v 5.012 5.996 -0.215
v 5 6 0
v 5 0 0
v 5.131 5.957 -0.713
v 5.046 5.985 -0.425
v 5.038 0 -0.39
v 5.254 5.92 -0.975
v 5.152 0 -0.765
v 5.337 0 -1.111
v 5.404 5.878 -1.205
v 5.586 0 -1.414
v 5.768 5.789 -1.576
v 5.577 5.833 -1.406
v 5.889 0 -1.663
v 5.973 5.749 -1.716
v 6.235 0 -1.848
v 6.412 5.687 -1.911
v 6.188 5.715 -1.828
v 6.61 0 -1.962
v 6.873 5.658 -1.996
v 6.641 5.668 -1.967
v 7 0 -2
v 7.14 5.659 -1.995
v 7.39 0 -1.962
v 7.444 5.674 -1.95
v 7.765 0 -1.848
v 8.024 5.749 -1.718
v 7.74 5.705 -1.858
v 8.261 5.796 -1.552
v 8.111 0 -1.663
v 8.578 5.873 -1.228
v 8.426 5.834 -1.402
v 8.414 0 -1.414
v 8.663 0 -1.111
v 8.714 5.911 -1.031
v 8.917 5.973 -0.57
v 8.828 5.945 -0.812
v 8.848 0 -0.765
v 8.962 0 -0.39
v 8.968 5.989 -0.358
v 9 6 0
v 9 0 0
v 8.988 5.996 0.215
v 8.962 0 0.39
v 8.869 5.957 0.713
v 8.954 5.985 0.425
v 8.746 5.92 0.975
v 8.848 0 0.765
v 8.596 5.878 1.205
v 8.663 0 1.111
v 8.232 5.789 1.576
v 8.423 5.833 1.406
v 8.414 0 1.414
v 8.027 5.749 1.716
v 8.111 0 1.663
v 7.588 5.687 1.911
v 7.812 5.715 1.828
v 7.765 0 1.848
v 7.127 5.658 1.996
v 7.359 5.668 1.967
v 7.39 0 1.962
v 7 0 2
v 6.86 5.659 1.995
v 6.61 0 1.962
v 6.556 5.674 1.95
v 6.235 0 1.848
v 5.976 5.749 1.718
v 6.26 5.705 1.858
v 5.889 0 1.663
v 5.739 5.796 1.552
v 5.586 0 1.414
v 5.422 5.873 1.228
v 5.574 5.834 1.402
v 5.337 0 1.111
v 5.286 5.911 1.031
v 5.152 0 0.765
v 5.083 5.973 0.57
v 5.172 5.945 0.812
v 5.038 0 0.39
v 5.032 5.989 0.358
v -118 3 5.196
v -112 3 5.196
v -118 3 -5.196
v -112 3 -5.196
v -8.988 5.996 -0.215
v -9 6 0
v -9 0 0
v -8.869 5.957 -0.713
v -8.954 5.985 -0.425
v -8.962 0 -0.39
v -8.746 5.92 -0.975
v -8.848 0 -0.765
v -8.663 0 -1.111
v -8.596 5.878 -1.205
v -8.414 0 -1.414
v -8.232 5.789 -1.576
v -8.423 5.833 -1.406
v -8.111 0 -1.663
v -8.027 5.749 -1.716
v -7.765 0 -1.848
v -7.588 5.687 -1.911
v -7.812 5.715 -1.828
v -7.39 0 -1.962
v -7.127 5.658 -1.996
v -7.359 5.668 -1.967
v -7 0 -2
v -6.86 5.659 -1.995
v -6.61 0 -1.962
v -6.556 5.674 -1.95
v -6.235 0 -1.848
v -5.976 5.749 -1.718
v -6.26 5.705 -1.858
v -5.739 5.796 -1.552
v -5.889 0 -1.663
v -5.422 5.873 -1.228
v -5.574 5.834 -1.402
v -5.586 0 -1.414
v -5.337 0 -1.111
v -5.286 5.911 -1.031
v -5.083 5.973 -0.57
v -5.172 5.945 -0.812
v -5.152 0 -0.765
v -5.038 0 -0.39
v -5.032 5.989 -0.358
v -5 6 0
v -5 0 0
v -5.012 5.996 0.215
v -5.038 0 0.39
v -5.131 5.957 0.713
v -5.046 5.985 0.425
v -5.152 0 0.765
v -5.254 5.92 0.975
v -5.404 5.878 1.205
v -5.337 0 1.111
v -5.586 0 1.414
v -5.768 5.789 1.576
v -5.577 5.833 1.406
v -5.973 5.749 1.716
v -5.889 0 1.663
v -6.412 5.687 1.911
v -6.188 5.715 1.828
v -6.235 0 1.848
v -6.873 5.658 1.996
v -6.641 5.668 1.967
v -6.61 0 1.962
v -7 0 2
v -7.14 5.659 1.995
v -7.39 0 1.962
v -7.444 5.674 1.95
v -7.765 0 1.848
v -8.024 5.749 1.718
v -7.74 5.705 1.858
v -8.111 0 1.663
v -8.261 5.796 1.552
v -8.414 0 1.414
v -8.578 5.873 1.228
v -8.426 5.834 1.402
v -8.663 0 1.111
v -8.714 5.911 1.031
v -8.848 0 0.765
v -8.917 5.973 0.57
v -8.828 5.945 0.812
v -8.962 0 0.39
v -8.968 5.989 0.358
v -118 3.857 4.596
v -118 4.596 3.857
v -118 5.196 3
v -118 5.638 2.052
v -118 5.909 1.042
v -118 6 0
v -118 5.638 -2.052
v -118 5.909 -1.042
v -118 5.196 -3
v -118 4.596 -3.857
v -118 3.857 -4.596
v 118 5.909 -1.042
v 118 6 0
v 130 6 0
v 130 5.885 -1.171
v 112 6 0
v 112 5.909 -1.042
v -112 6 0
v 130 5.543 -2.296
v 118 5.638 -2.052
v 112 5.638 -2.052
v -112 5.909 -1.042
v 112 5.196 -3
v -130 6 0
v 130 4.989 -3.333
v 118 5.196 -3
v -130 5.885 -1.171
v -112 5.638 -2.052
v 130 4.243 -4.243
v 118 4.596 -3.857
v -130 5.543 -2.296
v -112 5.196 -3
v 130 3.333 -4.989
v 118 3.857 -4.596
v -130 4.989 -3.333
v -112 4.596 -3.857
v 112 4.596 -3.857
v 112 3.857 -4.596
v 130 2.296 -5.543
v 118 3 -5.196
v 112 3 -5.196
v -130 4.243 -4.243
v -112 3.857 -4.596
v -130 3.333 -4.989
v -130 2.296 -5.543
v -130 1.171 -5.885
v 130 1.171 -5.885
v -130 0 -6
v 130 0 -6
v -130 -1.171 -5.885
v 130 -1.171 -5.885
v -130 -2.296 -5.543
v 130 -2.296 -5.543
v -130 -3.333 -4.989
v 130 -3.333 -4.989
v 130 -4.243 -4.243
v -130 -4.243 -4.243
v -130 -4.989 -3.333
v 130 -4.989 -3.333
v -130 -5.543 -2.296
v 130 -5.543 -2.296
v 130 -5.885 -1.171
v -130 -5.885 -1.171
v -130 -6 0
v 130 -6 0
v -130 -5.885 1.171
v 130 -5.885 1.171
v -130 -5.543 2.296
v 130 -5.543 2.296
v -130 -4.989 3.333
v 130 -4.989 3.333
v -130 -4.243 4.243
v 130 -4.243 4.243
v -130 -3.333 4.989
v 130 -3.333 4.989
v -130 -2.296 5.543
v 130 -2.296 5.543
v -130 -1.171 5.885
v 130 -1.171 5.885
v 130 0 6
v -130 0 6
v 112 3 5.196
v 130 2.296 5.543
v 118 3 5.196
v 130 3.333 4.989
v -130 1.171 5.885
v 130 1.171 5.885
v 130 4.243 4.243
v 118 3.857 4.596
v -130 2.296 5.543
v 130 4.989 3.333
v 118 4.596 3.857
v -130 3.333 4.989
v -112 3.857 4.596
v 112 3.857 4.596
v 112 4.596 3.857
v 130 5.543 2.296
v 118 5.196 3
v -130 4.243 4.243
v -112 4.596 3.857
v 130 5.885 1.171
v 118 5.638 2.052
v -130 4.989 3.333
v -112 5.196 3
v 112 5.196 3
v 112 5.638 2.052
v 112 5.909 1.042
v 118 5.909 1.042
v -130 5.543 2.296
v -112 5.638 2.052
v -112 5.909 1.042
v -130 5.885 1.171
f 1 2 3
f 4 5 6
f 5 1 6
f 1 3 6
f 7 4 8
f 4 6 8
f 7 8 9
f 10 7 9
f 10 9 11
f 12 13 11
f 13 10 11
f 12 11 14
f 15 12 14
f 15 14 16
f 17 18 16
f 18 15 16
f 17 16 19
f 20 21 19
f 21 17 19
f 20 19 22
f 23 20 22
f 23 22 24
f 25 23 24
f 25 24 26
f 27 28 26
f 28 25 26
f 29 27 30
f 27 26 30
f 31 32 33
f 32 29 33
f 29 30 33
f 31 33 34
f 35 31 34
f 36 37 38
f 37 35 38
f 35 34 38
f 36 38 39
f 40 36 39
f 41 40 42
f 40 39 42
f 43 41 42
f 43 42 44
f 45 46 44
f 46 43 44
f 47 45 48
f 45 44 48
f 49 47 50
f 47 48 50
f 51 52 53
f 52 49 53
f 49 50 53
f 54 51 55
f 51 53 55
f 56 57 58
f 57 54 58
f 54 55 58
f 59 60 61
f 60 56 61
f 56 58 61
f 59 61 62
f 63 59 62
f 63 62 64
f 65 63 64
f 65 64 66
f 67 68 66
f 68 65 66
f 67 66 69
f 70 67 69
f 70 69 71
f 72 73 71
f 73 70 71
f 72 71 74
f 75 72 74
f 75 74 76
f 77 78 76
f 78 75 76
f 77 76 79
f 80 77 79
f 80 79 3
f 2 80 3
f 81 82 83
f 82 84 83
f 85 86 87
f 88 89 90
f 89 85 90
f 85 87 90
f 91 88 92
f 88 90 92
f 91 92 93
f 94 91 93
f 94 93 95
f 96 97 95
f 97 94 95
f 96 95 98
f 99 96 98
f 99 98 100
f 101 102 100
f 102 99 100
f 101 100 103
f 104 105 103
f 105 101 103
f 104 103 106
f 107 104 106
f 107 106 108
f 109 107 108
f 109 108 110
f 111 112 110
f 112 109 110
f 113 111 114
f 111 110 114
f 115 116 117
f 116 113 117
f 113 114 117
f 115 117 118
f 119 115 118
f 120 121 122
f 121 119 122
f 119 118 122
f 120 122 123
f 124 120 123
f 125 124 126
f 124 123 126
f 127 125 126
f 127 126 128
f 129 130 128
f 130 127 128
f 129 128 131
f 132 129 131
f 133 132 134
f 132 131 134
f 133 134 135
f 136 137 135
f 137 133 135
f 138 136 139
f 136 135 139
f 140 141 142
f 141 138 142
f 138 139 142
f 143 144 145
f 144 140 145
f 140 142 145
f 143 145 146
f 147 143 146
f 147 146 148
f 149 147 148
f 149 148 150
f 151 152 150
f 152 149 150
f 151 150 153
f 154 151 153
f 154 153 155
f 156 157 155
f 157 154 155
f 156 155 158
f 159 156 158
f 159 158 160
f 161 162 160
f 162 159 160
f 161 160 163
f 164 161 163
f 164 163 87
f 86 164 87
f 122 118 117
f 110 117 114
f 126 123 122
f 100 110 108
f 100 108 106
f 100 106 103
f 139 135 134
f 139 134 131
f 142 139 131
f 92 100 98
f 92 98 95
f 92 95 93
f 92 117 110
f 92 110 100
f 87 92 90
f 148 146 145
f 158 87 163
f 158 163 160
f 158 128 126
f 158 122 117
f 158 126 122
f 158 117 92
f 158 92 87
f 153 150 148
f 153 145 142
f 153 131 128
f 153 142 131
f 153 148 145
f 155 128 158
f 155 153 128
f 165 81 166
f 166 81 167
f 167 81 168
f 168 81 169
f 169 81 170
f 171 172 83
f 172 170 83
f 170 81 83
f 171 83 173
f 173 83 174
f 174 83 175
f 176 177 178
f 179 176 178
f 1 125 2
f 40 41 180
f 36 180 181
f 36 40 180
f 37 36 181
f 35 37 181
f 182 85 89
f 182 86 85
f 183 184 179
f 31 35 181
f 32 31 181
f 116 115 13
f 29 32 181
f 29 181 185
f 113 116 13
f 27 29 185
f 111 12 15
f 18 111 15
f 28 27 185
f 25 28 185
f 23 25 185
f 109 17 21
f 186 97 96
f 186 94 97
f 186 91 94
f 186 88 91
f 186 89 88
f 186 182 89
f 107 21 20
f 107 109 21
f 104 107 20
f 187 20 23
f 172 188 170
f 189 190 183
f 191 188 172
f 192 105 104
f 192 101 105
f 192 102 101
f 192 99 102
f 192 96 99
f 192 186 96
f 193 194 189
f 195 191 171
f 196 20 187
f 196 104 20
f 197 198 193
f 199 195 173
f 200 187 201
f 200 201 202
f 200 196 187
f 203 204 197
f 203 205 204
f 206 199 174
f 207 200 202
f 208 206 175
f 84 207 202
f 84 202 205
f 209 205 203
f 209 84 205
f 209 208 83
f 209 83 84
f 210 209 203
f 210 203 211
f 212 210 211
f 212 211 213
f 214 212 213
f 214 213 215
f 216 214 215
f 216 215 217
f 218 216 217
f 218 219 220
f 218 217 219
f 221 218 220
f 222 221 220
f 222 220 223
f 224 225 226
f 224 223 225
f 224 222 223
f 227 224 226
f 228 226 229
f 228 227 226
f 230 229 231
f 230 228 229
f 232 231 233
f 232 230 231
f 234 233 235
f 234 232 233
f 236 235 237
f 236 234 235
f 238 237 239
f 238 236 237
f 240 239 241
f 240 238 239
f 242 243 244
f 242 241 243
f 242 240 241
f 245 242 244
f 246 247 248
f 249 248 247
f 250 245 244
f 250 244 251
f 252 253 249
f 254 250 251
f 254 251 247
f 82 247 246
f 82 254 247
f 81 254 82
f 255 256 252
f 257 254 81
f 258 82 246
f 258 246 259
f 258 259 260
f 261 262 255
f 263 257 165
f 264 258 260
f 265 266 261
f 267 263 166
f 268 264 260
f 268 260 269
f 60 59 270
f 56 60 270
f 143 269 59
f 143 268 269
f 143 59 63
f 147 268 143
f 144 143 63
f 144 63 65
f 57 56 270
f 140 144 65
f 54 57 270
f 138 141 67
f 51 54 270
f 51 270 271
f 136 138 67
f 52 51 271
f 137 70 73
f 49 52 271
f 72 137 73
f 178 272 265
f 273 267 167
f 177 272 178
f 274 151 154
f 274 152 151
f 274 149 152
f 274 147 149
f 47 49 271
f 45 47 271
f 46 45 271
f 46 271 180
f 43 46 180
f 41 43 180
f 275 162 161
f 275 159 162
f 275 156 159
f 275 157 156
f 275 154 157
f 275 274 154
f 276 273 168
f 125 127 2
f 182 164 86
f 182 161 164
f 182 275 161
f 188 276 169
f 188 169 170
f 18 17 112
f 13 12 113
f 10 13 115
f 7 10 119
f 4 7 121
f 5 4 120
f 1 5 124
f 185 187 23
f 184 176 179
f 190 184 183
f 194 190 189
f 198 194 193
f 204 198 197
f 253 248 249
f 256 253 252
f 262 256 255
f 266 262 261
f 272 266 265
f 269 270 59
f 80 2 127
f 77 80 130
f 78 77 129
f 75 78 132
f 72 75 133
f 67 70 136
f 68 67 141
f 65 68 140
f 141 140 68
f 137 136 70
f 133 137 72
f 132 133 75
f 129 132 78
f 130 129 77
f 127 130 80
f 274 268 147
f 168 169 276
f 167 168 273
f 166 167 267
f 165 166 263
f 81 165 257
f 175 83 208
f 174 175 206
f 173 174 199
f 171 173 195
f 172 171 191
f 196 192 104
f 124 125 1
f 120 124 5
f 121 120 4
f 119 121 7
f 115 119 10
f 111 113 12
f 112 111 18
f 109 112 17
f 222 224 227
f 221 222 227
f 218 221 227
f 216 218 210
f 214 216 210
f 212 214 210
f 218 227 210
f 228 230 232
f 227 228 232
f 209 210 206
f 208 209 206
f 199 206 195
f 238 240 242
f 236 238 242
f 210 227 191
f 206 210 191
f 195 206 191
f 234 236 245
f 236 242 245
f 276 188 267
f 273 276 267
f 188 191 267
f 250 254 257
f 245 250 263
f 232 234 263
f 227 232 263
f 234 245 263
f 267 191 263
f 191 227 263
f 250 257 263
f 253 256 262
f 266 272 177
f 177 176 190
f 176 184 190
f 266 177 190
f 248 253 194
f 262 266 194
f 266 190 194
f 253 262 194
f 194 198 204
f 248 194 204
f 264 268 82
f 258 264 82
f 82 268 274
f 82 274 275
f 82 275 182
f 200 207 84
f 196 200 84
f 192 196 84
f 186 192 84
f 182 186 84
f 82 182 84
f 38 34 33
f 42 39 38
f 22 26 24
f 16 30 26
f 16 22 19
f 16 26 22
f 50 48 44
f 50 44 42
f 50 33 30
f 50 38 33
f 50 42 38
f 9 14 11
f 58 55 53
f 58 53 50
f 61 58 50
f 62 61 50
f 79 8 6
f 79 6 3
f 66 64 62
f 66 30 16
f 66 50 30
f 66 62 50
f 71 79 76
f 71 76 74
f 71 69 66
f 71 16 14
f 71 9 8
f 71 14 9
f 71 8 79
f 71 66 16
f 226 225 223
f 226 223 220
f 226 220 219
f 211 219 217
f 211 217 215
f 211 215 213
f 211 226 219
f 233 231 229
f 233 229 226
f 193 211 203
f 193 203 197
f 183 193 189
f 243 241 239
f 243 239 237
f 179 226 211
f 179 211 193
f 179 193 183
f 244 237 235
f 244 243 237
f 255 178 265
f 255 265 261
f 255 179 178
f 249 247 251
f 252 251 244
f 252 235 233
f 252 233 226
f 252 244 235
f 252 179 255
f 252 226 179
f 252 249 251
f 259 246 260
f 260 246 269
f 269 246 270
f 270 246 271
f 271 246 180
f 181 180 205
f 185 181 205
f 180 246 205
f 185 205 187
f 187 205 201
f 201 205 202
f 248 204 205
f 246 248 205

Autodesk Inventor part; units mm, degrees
ref_plane "YZ Plane" through (0, 0, 0) normal (1, 0, 0) x (0, 1, 0)
ref_plane "XZ Plane" through (0, 0, 0) normal (0, 1, 0) x (-1, 0, 0)
ref_plane "XY Plane" through (0, 0, 0) normal (0, 0, 1) x (1, 0, 0)
sketch "Sketch1" plane through (0, 0, 0) normal (1, 0, 0) x (0, 1, 0)
  circle A0 centre (0, 0) radius 6
  dimension "d0" = 12
extrude "Extrusion1" add sketch "Sketch1" along normal mid plane 260
sketch "Sketch2" plane through (0, 0, 0) normal (0, 0, 1) x (1, 0, 0)
  line L0 (-130, 6) -> (-130, -6) projected
  line L1 (-130, 0) -> (-115, 0)
  line L2 (-115, 0) -> (-115, 6)
  line L3 (130, -6) -> (130, 6) projected
  line L4 (130, 0) -> (115, 0)
  line L5 (115, 0) -> (115, 6)
  line L6 (112, 9) -> (118, 9)
  line L7 (118, 9) -> (118, 3)
  line L8 (118, 3) -> (112, 3)
  line L9 (112, 3) -> (112, 9)
  line L10 (112, 9) -> (118, 3) construction
  line L11 (118, 9) -> (112, 3) construction
  line L12 (-118, 9) -> (-112, 9)
  line L13 (-112, 9) -> (-112, 3)
  line L14 (-112, 3) -> (-118, 3)
  line L15 (-118, 3) -> (-118, 9)
  line L16 (-118, 9) -> (-112, 3) construction
  line L17 (-112, 9) -> (-118, 3) construction
  point P0 (0, 0)
  dimension "d3" = 15
  dimension "d4" = 15
  dimension "d5" = 6
  dimension "d6" = 6
extrude "Extrusion2" cut sketch "Sketch2" along normal mid plane 20
sketch "Sketch3" plane through (0, 0, 0) normal (0, 1, 0) x (-1, 0, 0)
  line L0 (-130, 6) -> (-130, -6) projected
  line L1 (-130, -6) -> (-5, -6)
  line L2 (130, -6) -> (-130, -6) projected
  line L3 (-5, -6) -> (-5, 0)
  line L4 (130, 6) -> (-130, 6) projected
  line L5 (-5, 0) -> (5, 0)
  line L6 (5, 0) -> (7, 0)
  line L7 (-5, 0) -> (-7, 0)
  circle A0 centre (7, 0) radius 2
  circle A1 centre (-7, 0) radius 2
  point P0 (0, 0)
  dimension "d9" = 125
  dimension "d10" = 10
  dimension "d11" = 2
  dimension "d12" = 2
extrude "Extrusion3" cut sketch "Sketch3" along normal blind 10
thread "Thread1" size "M4x0.7" class "6H" standard "ANSI Metric M Profile" full length
thread "Thread2" size "M4x0.7" class "6H" standard "ANSI Metric M Profile" full length
properties part number "base_axis_12mm" material "Stainless Steel"
